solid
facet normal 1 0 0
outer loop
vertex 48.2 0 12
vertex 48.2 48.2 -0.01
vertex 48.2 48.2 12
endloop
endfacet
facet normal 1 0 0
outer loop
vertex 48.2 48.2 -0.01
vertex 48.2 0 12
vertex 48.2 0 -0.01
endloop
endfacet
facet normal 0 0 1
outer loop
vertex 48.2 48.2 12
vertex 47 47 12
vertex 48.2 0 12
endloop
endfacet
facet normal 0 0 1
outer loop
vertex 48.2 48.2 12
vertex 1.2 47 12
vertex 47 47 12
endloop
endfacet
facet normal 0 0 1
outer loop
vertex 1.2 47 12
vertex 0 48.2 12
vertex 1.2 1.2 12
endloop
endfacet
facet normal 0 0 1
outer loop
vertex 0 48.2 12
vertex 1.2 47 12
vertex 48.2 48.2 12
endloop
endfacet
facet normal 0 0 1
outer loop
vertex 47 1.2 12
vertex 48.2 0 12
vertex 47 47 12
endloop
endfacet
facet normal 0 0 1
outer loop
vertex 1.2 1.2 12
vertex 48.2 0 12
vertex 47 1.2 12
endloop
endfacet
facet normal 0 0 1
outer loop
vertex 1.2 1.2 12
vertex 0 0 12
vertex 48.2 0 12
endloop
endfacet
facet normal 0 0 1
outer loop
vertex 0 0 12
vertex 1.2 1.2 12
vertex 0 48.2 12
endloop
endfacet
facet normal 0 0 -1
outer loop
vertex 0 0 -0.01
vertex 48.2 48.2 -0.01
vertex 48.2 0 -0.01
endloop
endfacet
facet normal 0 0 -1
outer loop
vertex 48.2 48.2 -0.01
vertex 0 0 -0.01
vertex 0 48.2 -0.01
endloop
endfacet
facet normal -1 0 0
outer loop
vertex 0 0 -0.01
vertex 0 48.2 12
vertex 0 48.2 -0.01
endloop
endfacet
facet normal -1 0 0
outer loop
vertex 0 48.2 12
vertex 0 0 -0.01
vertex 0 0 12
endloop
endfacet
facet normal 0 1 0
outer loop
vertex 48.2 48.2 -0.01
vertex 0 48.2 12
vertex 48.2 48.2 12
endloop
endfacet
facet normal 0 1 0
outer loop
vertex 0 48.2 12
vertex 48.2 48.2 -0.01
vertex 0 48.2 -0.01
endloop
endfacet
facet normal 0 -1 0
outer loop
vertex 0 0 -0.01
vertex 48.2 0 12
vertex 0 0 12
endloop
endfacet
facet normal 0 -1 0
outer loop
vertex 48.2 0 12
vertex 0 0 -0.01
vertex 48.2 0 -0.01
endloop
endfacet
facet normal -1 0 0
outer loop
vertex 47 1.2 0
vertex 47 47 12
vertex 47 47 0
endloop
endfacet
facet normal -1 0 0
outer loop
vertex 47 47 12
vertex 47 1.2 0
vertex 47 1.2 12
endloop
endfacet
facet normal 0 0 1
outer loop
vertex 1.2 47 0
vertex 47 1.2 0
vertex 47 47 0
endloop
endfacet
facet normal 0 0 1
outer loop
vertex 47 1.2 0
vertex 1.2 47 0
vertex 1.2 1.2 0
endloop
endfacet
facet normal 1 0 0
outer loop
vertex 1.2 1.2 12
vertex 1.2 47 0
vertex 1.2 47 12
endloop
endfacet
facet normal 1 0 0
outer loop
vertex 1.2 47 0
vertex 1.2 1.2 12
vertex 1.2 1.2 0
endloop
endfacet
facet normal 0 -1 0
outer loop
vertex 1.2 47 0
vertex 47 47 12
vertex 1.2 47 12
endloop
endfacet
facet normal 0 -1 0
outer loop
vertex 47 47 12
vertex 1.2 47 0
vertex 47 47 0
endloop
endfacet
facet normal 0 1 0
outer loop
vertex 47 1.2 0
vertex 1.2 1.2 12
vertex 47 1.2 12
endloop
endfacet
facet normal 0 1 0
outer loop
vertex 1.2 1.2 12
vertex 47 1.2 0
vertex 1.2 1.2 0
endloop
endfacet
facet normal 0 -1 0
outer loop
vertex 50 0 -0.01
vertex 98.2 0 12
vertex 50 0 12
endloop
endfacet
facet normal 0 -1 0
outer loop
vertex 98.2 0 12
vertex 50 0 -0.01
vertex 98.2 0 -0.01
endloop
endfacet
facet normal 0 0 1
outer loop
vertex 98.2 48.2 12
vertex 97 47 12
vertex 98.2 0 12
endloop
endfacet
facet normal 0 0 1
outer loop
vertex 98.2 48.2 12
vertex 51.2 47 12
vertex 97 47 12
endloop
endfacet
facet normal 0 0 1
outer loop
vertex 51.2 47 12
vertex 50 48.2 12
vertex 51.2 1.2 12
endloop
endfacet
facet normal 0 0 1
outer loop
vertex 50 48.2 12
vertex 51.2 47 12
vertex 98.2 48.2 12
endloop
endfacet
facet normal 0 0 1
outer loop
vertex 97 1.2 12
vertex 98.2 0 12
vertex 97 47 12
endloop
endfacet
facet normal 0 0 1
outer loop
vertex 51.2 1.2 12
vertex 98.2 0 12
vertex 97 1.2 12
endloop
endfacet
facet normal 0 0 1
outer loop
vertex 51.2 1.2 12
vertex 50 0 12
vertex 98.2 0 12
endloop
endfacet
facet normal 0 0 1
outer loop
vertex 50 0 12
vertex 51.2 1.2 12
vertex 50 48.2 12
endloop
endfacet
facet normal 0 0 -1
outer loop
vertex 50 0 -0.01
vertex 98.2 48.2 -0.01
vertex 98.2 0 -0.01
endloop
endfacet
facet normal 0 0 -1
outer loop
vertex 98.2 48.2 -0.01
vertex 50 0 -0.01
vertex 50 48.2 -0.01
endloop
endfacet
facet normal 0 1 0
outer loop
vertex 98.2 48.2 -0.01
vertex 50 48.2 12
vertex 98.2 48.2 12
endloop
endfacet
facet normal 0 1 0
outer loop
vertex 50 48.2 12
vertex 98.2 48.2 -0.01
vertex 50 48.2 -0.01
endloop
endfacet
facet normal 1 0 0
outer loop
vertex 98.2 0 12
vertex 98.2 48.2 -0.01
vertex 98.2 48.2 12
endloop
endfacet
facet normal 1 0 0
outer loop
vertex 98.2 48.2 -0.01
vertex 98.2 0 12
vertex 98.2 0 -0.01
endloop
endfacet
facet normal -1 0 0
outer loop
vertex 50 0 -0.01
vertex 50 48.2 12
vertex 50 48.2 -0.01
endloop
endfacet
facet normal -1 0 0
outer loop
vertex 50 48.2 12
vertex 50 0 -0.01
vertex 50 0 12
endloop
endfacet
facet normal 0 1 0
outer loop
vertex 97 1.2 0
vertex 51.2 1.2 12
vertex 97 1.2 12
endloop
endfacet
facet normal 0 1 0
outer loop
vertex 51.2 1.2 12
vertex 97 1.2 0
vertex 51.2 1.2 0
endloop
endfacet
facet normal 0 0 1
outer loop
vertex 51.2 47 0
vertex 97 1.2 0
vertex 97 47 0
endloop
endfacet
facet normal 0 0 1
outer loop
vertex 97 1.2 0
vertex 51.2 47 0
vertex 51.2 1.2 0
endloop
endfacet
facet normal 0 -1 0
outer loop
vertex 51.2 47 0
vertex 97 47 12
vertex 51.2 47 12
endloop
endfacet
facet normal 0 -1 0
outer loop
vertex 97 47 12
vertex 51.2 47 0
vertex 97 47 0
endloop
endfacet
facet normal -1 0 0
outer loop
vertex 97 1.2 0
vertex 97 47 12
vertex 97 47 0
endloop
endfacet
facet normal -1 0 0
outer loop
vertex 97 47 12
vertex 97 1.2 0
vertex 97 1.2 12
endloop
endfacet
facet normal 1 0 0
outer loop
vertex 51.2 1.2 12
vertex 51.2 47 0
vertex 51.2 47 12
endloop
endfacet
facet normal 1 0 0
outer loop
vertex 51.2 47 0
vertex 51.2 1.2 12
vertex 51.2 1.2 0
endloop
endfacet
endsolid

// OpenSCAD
// file: ../../Base/Boxes.scad
// Fischertechnik Box Foundation
// Pre-designed Boxes

use <Constants.scad>

include <PlacementOptions.scad>

box190Width = 190;
box190Depth = 130;
box130Width = 130;
box130Depth = 95;
boxUsageHeight = 33.9;
boxWallThickness = 2.4;
boxBaseThickness = 1.0;
boxWebWidth = 3.0;

// getBoxWallThickness()
// Gets the wall thickness of a Fischertechnik Box

function getBoxWallThickness() = boxWallThickness;

// Gets the usable height of a fischertechnik box
function getBoxUsageHeight() = boxUsageHeight;

// Gets the thickness of the Fischertechnik box base.
function getBoxBaseThickness() = boxBaseThickness;

// Gets the width of a box web
function getBoxWebWidth() = boxWebWidth;

// Gets the usable inner space of a Box 190 as an x/y-list
function getBox190Space() = [
    box190Width - 2*getBoxWallThickness(), 
    box190Depth - 2*getBoxWallThickness() ];

// Imports the Fischertechnik empty box 130x190 mm and places it at position 0,0
// 190x130 are the outer sizes, the inner space is slightly smaller. Use getBox190Space() to get the inner sizes.
// This module needs the STL file "Fischertechnik Box 130x190.stl" in the library path.
// The box is positioned that the usable inner space is at the 0,0,0 position. The

module Box190() {
    translate([-getBoxWallThickness(),-getBoxWallThickness(),-getBoxBaseThickness()])
        import("Fischertechnik Box 130x190.stl", convexity=3);
}

// Gets the usable inner space of a Box 130 as an x/y-list
function getBox130Space() = [
    box130Width - 2*getBoxWallThickness(), 
    box130Depth - 2*getBoxWallThickness() ];

// Imports the Fischertechnik empty box 95x130 mm and places it at position 0,0
// 190x130 are the outer sizes, the inner space is slightly smaller. Use getBox190Space() to get the inner sizes.
// This module needs the STL file "Fischertechnik Box 95x130.stl" in the library path.
// The box is positioned that the usable inner space is at the 0,0,0 position. The

module Box130() {
    translate([-getBoxWallThickness(),-getBoxWallThickness(),-getBoxBaseThickness()])
        import("Fischertechnik Box 95x130.stl", convexity=3);
}

// Creates a web at the specified box walls
// corner 0 = LowerLeft, 1 = UpperLeft, 2 = UpperRight, 3 = LowerRight
// side 0 = LeftOfCorner, 1 = RightOfCorner
// distance = Distance in mm from the corner
// box = inner width and depth of the box (default: Box 190)
// webWidth = length of the web (default is 3 mms)
// webThickness = thickness of the web (default is 1 mm)

module BoxWeb(corner, side, distance, box=getBox190Space(), webWidth=getBoxWebWidth(), webThickness=1.0) {
    sink = getBoxWallThickness()/2;

    width = (corner % 2 == 0) ? 
            (side == LeftOfCorner ? webWidth : webThickness) :
            (side == LeftOfCorner ? webThickness : webWidth);

    depth = (corner % 2 == 0) ? 
            (side == RightOfCorner ? webWidth : webThickness) :
            (side == RightOfCorner ? webThickness : webWidth);
    
    xDiff = corner == LowerLeft ? 
                (side == LeftOfCorner ? -sink : distance) :
            (corner == UpperLeft ?                
                (side == LeftOfCorner ? distance : -sink) :
            (corner == UpperRight ?
                (side == LeftOfCorner ? box.x-webWidth+sink : box.x-distance-webThickness) :
                (side == LeftOfCorner ? box.x-distance-webThickness: box.x-webWidth+sink)));

    yDiff = corner == LowerLeft ? 
                (side == RightOfCorner ? -sink : distance) :
            (corner == UpperLeft ?
                (side == RightOfCorner ? box.y-distance : box.y-webWidth+sink) :
            (corner == UpperRight ?
                (side == RightOfCorner ? box.y-webWidth+sink : box.y-distance) :
                (side == RightOfCorner ? distance : -sink)));
    
    translate([xDiff, yDiff, -getExcess()])
        cube([width, depth, boxUsageHeight + 2*getExcess()]);
}
// file: ../../Base/Rotation.scad
// Fischertechnik Box Foundation
// Geometry Helpers Rotation

include <PlacementOptions.scad>

// getRotatedSpace(space, rotation=NoRotation)
// Rotates the space dependent on the specified rotation

function getRotatedSpace(space, rotation=NoRotation) = [
    (rotation == Rotate90 || rotation == Rotate270) ? space.y : space.x,
    (rotation == Rotate90 || rotation == Rotate270) ? space.x : space.y
];

// Rotates the given space around the fixed left lower corner
// space = the space the children needs as width/depth list [width,depth]
// rotation = 0 Rotate0 degrees, 1 Rotate90 degrees, 2 Rotate180 degrees, 3 Rotate270 degrees (equivalent to -90)

module RotateFix(space, rotation=Rotate0) {
    dy = (rotation == Rotate0 || rotation == Rotate270) ? 0 :
        (rotation == Rotate90) ? space.x :
        space.y;
    dx = (rotation < Rotate180) ? 0 :
        (rotation == Rotate180) ? space.x :
        space.y;
    
    translate([dx, dy, 0])
        rotate([0, 0, rotations[rotation]])
            children();
}
// file: ../../Base/Alignment.scad
// Fischertechnik Box Foundation
// Geometry Helpers Alignment

include <PlacementOptions.scad>

// getAlignedX(elementWidth, spaceWidth, align=AlignRight, offset=0)
// Gets the aligned X offset of an element with the given
// width in the given space.
// elementWidth = The width of the element to positon
// spaceWidth = The space where the element should be aligned
// align = 0 AlignLeft, 1 AlignCenter, 2 AlignRight
// offset = an optional offset from the aligned position. When
// aligned left or centered, then positive values are in X direction.
// When aligned right then positive values are in negative X direction.

function getAlignedX(elementWidth, spaceWidth, align=AlignRight, offset=0) =
    (align == AlignLeft) ?
        offset :
        ((align == AlignCenter) ?
        (spaceWidth - elementWidth)/2 + offset :
        spaceWidth - offset - elementWidth);

// getAlignedY(elementDepth, spaceDepth, align=AlignTop, offset=0)
// Gets the aligned Y offset of an element with the given
// depth in the given space.
// elementDepth = The depth of the element to positon
// spaceDepth = The space where the element should be aligned
// align = 0 AlignBottom, 1 AlignCenter, 2 AlignTop
// offset = an optional offset from the aligned position. When
// aligned bottom or centered, then positive values are in Y direction.
// When aligned top then positive values are in negative Y direction.

function getAlignedY(elementDepth, spaceDepth, align=AlignTop, offset=0) =
    (align == AlignBottom) ?
        offset :
        ((align == AlignCenter) ?
        (spaceDepth - elementDepth)/2 + offset :
        spaceDepth - offset - elementDepth);
// file: ../../Base/Constants.scad
// Fischertechnik Box Foundation
// Constants

// Constant values necessary for multiple elements

// Base constants
dividerThickness = 1.2;
excess = 0.01;
fragments = 90;
tolerance = 0.8;

// Gets the thickness of a divider 
function getDividerThickness() = dividerThickness;

// Gets the excess that is used to merge walls into each other
function getExcess() = excess;

// Gets amount of fragments of a cylinder
function getFragments() = fragments;

// Gets the inner tolerance of a frame to each side
function getTolerance() = tolerance;


// Fischertechnik specific constants
axisDiameter = 4;
axisBottomDiameter = axisDiameter + 1;
standardEdgeDistance = 2.5;
standardWebDistance = 11.5;
standardCornerLength = 15;
tubeWallFactor = 0.8;

// Gets axis diameter
function getAxisDiameter() = axisDiameter;

// Gets axis bottom diameter for thicker part at the bottom
function getAxisBottomDiameter() = axisBottomDiameter;

// gets the standard distance to the wall of the box for dockable frames with webs
function getStandardEdgeDistance() = standardEdgeDistance;

// gets the standard distance of each web to the corner of the dockable frame
function getStandardWebDistance() = standardWebDistance;

// gets the standard length of the corner walls of a dockable frame
function getStandardCornerLength() = standardCornerLength;

// gets the wall thickness of a tube.
function getTubeWallThickness() = tubeWallFactor * getDividerThickness();
// file: ../../Base/PlacementOptions.scad
// Fischertechnik Box Foundation
// Placement Options

// Alignment
NoAlign = 0;
AlignLeft = 1;
AlignBottom = 2;
AlignCenter = 3;
AlignRight = 4;
AlignTop = 5;

// Element rotation degree steps
rotations = [0, -90, -180, -270];

// Rotation
NoRotation = 0;
Rotate0 = 0;
Rotate90 = 1;
Rotate180 = 2;
Rotate270 = 3;

// Docking (seen from above)
NoDock = -1;
DockLeft = 0;
DockTop = 1;
DockRight = 2;
DockCorner = 2;
DockBottom = 3;

// Web corners
LowerLeft = 0;
UpperLeft = 1;
UpperRight = 2;
LowerRight = 3;

// Web position relative to corner
LeftOfCorner = 0;
RightOfCorner = 1;
// file: ../../Elements/FrameGearBox.scad
// Fischertechnik Box Library
// Frame for gear box
// 31048

use <../ModelBase/Simple.scad>

width = 45;
depth = 45;
height = 12;

// getFrameGearBoxSpace()
// Gets the space of a frame for a gearbox (mot2)

function getFrameGearBoxSpace() = getFrameOuterVolume([width, depth, height]);

// FrameGearBox()
// frame for a gearbox (mot2)

module FrameGearBox() {
    Frame([width, depth, height]);
}

// Tests
color("lightgray")
FrameGearBox();
// file: ../../Base/Placement.scad
// Fischertechnik Box Foundation
// Geometry Helpers Placement

use <Constants.scad>
use <Alignment.scad>
use <Rotation.scad>
use <Boxes.scad>

include <PlacementOptions.scad>

// Place(x=0, y=0, elementSpace=[0,0], alignX=AlignLeft, alignY=AlignBottom, rotation=Rotate0, boxSpace=getBox190Space())
// Places the child at the specified position
// y = Y-Position. This is a relative position when an X aligment is specified.
// x = X-Position. This is a relative position when an Y aligment is specified.
// elementSpace = space of the element to be placed [x,y]
// alignX = -1=NoAlign, 0 AlignLeft, 1 AlignCenter, 3 AlignRight (elementSpace and boxSpace required!)
// alignY = -1=NoAlign, 2 AlignBottom, 1 AlignCenter, 4 AlignTop (elementSpace and boxSpace required!)
// rotation = 0 Rotate0 0 degrees, 1 Rotate90 90 degrees, 
// 2 Rotate180 180 degrees, 3 Rotate270 270 degrees (equivalent to -90)
// boxSpace = Inner space of the box where the placement occurs [x,y] - default is Box 190x130 inner space

module Place(x=0, y=0, elementSpace=[0,0], 
  alignX=AlignLeft, alignY=AlignBottom, 
  rotation=NoRotation, boxSpace=getBox190Space()) {

    module Position(x, y, space, rotation=Rotate0) {
        translate([x, y, 0])
            RotateFix(space, rotation)
                children();
    }

    space = getRotatedSpace(elementSpace, rotation);
    alignedX = getAlignedX(space.x, boxSpace.x, alignX, x);
    alignedY = getAlignedY(space.y, boxSpace.y, alignY, y);
    Position(alignedX, alignedY, elementSpace, rotation)
        children();
}

// Center(space=getBox130Space(), elementSpace=[0,0])
// space = Space where the children is centered. For cylinder use centered=true and no elementSpace.
// elementSpace = space of the element to be centered [x,y]

module Center(space=getBox190Space(), elementSpace=[0,0]) {
    translate([(space.x - elementSpace.x) / 2, (space.y - elementSpace.y) / 2])
        children(0);
}

// CenterHorizontal(width=0, y=0, offset=0, space=getBox130Space())
// space = Space where the children is centered. For cylinder use centered=true and no elementSpace.
// elementSpace = space of the element to be centered [x,y]

module CenterHorizontal(width=0, y=0, offset=0, space=getBox190Space()) {
    translate([(space.x - width) / 2 + offset, y])
        children(0);
}

// CenterVertical(depth=0, x=0, offset=0, space=getBox130Space())
// space = Space where the children is centered. For cylinder use centered=true and no elementSpace.
// elementSpace = space of the element to be centered [x,y]

module CenterVertical(depth=0, x=0, offset=0, space=getBox190Space()) {
    translate([x, (space.y - depth) / 2 + offset])
        children(0);
}
// main file
// Fischertechnik Box Foundation
// Elements
// Test FrameGearBox

use <../../Base/Placement.scad>
use <../../Elements/FrameGearBox.scad>

include <../../Base/PlacementOptions.scad>

FrameGearBox();

Place(50, 0, getFrameGearBoxSpace(), rotation=Rotate90)
    FrameGearBox();
